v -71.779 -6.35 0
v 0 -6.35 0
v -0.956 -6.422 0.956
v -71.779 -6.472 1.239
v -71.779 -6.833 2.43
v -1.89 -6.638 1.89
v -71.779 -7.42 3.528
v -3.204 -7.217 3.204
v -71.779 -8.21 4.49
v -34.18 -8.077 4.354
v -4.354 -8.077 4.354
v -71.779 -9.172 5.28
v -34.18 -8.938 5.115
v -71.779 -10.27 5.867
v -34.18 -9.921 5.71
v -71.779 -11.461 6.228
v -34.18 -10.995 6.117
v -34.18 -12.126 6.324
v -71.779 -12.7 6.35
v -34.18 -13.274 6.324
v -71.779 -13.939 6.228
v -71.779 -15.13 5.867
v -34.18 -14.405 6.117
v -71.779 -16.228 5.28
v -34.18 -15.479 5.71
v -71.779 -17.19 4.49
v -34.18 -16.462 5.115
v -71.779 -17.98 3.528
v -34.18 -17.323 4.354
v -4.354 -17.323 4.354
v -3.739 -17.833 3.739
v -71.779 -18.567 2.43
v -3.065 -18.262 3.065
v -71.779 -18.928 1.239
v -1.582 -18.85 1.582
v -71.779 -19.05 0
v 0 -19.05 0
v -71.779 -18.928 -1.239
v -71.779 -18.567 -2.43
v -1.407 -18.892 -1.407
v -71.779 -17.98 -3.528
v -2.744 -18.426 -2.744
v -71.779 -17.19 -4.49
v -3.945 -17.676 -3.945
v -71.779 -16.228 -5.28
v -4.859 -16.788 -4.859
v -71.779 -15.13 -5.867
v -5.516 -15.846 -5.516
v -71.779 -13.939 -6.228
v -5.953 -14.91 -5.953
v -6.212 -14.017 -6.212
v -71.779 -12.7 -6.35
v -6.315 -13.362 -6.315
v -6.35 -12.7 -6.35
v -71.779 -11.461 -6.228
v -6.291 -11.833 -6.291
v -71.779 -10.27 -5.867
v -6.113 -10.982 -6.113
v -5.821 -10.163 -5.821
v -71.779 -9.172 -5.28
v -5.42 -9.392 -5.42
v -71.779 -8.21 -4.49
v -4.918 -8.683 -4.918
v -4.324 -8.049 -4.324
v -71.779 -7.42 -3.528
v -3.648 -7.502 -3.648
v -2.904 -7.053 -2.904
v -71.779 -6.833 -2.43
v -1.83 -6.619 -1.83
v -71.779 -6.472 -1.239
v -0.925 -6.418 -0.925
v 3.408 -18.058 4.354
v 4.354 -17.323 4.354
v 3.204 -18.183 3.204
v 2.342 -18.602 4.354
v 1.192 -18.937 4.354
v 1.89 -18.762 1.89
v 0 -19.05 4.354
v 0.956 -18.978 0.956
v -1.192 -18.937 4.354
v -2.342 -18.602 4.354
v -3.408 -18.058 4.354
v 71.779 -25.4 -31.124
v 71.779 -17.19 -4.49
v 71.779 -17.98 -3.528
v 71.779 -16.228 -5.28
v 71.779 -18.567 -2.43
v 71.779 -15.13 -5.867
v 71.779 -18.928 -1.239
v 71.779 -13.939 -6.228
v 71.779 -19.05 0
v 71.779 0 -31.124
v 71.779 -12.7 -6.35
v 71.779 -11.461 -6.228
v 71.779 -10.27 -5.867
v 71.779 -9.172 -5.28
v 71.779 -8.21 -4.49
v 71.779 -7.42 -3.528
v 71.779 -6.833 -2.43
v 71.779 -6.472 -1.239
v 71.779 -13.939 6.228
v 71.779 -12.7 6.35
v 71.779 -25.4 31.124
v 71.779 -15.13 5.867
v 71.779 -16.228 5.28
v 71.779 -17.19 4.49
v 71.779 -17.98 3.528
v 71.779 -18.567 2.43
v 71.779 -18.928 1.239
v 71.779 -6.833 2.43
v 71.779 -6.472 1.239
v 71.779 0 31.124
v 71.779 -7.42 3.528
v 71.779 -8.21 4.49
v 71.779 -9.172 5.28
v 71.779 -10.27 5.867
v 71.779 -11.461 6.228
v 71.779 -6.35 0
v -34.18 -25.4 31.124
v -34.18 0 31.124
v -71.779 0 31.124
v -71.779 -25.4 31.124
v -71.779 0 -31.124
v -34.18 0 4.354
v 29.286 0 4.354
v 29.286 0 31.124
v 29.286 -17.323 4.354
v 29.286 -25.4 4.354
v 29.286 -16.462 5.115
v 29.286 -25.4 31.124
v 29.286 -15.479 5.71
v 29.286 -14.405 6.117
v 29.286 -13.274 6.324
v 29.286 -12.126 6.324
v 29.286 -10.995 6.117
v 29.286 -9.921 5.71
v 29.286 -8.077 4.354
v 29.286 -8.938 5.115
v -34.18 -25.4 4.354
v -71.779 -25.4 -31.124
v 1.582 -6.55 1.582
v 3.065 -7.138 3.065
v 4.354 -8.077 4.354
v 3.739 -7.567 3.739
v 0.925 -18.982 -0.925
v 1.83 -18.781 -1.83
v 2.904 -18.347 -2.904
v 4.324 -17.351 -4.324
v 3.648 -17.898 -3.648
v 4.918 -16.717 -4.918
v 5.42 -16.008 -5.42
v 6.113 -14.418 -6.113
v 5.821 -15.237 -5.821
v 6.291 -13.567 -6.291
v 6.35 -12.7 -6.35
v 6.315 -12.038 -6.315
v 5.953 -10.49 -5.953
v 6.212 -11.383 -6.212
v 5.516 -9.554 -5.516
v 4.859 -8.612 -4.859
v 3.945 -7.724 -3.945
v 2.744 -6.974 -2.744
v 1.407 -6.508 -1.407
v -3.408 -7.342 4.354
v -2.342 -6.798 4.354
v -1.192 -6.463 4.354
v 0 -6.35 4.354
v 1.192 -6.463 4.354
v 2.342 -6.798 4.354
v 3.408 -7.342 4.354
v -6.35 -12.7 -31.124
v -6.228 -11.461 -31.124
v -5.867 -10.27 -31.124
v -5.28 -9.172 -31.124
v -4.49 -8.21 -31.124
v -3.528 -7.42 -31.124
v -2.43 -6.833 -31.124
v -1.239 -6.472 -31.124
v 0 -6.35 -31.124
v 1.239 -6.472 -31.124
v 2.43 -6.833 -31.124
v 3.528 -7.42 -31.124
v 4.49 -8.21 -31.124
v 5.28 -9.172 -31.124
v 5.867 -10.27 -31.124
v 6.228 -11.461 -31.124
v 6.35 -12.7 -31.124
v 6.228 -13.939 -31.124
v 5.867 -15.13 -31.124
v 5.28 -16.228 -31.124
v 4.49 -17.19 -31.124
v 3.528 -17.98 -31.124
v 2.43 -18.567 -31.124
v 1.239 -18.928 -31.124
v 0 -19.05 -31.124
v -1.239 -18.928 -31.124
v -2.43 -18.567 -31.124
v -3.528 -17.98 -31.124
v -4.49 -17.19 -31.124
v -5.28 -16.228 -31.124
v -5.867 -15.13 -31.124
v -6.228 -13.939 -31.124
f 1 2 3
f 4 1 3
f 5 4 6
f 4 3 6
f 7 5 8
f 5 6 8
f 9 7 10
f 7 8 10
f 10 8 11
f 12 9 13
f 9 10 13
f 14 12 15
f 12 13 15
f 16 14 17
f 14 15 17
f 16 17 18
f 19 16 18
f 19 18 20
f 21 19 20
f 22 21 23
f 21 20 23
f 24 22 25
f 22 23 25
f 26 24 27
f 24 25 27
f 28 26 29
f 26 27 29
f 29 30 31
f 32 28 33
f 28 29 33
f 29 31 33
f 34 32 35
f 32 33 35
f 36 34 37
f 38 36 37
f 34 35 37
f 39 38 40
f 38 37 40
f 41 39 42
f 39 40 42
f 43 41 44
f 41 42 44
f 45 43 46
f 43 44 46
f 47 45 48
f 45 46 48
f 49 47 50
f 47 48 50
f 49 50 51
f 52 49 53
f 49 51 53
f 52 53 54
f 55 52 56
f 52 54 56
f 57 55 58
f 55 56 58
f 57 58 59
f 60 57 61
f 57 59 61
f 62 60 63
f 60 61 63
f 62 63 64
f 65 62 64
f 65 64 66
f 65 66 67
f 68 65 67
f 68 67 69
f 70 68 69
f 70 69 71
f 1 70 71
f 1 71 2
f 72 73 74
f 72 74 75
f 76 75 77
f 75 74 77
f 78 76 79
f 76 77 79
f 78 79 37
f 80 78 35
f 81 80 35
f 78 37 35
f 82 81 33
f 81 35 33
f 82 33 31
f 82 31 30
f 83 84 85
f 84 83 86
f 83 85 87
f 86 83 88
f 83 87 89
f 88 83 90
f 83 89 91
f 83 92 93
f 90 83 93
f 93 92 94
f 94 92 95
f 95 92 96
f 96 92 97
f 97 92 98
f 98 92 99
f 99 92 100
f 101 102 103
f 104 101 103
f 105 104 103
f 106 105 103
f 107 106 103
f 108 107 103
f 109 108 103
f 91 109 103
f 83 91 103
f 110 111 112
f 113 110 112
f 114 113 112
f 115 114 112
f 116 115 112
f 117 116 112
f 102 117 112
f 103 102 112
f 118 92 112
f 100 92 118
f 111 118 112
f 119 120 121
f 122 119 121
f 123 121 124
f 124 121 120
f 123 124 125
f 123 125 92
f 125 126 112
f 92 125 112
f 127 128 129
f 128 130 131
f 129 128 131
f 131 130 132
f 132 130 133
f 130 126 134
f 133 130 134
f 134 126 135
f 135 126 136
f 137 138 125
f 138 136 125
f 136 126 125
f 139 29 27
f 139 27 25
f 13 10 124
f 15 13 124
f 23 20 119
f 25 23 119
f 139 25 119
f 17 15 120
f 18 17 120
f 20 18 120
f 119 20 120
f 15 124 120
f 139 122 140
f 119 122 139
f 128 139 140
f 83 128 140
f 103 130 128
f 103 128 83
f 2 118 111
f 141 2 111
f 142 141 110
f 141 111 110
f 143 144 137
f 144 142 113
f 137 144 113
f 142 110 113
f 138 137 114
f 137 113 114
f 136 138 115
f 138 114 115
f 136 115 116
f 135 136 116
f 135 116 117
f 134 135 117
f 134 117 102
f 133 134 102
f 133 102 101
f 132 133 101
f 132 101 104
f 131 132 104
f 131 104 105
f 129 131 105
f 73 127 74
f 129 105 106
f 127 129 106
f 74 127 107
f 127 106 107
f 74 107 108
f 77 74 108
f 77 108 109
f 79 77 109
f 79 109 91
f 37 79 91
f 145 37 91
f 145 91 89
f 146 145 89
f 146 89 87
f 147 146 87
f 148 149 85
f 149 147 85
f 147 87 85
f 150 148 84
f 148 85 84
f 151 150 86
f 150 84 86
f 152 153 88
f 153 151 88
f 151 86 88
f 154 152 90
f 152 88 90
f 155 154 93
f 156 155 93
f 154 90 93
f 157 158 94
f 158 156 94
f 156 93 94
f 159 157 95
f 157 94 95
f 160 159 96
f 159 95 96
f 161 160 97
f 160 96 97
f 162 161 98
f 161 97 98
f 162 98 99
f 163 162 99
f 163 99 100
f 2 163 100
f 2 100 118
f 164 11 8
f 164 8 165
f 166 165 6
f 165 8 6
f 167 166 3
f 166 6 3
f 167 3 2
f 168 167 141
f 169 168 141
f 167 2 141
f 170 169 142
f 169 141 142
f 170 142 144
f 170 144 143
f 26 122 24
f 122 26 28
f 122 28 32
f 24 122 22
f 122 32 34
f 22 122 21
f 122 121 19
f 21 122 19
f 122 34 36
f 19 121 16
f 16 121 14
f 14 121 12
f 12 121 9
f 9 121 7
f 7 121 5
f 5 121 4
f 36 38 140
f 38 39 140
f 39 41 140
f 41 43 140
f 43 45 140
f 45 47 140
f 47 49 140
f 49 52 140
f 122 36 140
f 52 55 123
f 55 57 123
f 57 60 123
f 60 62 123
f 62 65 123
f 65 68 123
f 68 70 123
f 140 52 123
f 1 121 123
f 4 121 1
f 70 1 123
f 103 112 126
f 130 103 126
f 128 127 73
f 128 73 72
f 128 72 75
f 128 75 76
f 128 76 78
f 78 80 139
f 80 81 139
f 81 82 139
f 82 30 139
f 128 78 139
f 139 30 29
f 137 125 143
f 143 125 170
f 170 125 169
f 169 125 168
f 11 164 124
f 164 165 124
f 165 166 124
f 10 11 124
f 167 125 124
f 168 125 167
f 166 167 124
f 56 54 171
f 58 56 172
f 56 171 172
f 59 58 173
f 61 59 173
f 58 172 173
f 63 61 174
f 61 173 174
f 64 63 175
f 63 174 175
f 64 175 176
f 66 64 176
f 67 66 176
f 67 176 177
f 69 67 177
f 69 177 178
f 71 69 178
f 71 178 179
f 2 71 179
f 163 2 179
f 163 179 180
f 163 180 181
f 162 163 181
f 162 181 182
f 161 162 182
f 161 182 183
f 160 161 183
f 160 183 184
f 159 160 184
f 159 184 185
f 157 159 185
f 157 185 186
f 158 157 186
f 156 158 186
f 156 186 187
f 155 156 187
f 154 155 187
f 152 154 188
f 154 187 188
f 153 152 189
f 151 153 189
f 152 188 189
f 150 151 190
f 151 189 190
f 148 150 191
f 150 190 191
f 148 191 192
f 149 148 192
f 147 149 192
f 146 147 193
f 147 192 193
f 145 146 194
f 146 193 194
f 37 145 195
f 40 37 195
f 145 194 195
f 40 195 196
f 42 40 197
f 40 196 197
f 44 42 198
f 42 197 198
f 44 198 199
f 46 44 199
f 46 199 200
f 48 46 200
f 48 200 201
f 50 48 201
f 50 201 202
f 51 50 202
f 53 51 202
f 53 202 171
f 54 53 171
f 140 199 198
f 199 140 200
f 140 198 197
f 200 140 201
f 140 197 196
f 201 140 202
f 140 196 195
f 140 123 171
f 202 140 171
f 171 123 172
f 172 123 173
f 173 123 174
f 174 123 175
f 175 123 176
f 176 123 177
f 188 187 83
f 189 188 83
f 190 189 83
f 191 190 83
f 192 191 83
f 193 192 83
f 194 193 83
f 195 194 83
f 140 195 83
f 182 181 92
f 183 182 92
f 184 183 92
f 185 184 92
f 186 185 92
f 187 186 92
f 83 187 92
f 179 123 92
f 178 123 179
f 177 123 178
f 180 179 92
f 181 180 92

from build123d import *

# Parameters (mm, degrees)
F1_DEPTH = 25.4
F3_D     = 12.7
F5_D     = 12.7


with BuildPart() as f1:
    # F0 (on Front) → F1 (new body)
    with BuildSketch(Plane.XZ):
        Polygon((-34.180485, 31.123895), (-71.779169, 31.123895), (-71.779169, -31.123895), (71.779169, -31.123895), (71.779169, 31.123895), (29.286098, 31.123895), (29.286098, 4.353631), (-34.180485, 4.353631), align=None)
    extrude(amount=F1_DEPTH)

    # F3 (through all)
    with Locations(Plane.XY.offset(4.353631)):
        with Locations((0, -12.7)):
            Hole(F3_D / 2)

    # F5 (through all)
    with Locations(Plane(origin=(-71.779169, 0, 0), x_dir=(0, -1, 0), z_dir=(-1, 0, 0))):
        with Locations((12.7, 0)):
            Hole(F5_D / 2)


solid = f1.part
